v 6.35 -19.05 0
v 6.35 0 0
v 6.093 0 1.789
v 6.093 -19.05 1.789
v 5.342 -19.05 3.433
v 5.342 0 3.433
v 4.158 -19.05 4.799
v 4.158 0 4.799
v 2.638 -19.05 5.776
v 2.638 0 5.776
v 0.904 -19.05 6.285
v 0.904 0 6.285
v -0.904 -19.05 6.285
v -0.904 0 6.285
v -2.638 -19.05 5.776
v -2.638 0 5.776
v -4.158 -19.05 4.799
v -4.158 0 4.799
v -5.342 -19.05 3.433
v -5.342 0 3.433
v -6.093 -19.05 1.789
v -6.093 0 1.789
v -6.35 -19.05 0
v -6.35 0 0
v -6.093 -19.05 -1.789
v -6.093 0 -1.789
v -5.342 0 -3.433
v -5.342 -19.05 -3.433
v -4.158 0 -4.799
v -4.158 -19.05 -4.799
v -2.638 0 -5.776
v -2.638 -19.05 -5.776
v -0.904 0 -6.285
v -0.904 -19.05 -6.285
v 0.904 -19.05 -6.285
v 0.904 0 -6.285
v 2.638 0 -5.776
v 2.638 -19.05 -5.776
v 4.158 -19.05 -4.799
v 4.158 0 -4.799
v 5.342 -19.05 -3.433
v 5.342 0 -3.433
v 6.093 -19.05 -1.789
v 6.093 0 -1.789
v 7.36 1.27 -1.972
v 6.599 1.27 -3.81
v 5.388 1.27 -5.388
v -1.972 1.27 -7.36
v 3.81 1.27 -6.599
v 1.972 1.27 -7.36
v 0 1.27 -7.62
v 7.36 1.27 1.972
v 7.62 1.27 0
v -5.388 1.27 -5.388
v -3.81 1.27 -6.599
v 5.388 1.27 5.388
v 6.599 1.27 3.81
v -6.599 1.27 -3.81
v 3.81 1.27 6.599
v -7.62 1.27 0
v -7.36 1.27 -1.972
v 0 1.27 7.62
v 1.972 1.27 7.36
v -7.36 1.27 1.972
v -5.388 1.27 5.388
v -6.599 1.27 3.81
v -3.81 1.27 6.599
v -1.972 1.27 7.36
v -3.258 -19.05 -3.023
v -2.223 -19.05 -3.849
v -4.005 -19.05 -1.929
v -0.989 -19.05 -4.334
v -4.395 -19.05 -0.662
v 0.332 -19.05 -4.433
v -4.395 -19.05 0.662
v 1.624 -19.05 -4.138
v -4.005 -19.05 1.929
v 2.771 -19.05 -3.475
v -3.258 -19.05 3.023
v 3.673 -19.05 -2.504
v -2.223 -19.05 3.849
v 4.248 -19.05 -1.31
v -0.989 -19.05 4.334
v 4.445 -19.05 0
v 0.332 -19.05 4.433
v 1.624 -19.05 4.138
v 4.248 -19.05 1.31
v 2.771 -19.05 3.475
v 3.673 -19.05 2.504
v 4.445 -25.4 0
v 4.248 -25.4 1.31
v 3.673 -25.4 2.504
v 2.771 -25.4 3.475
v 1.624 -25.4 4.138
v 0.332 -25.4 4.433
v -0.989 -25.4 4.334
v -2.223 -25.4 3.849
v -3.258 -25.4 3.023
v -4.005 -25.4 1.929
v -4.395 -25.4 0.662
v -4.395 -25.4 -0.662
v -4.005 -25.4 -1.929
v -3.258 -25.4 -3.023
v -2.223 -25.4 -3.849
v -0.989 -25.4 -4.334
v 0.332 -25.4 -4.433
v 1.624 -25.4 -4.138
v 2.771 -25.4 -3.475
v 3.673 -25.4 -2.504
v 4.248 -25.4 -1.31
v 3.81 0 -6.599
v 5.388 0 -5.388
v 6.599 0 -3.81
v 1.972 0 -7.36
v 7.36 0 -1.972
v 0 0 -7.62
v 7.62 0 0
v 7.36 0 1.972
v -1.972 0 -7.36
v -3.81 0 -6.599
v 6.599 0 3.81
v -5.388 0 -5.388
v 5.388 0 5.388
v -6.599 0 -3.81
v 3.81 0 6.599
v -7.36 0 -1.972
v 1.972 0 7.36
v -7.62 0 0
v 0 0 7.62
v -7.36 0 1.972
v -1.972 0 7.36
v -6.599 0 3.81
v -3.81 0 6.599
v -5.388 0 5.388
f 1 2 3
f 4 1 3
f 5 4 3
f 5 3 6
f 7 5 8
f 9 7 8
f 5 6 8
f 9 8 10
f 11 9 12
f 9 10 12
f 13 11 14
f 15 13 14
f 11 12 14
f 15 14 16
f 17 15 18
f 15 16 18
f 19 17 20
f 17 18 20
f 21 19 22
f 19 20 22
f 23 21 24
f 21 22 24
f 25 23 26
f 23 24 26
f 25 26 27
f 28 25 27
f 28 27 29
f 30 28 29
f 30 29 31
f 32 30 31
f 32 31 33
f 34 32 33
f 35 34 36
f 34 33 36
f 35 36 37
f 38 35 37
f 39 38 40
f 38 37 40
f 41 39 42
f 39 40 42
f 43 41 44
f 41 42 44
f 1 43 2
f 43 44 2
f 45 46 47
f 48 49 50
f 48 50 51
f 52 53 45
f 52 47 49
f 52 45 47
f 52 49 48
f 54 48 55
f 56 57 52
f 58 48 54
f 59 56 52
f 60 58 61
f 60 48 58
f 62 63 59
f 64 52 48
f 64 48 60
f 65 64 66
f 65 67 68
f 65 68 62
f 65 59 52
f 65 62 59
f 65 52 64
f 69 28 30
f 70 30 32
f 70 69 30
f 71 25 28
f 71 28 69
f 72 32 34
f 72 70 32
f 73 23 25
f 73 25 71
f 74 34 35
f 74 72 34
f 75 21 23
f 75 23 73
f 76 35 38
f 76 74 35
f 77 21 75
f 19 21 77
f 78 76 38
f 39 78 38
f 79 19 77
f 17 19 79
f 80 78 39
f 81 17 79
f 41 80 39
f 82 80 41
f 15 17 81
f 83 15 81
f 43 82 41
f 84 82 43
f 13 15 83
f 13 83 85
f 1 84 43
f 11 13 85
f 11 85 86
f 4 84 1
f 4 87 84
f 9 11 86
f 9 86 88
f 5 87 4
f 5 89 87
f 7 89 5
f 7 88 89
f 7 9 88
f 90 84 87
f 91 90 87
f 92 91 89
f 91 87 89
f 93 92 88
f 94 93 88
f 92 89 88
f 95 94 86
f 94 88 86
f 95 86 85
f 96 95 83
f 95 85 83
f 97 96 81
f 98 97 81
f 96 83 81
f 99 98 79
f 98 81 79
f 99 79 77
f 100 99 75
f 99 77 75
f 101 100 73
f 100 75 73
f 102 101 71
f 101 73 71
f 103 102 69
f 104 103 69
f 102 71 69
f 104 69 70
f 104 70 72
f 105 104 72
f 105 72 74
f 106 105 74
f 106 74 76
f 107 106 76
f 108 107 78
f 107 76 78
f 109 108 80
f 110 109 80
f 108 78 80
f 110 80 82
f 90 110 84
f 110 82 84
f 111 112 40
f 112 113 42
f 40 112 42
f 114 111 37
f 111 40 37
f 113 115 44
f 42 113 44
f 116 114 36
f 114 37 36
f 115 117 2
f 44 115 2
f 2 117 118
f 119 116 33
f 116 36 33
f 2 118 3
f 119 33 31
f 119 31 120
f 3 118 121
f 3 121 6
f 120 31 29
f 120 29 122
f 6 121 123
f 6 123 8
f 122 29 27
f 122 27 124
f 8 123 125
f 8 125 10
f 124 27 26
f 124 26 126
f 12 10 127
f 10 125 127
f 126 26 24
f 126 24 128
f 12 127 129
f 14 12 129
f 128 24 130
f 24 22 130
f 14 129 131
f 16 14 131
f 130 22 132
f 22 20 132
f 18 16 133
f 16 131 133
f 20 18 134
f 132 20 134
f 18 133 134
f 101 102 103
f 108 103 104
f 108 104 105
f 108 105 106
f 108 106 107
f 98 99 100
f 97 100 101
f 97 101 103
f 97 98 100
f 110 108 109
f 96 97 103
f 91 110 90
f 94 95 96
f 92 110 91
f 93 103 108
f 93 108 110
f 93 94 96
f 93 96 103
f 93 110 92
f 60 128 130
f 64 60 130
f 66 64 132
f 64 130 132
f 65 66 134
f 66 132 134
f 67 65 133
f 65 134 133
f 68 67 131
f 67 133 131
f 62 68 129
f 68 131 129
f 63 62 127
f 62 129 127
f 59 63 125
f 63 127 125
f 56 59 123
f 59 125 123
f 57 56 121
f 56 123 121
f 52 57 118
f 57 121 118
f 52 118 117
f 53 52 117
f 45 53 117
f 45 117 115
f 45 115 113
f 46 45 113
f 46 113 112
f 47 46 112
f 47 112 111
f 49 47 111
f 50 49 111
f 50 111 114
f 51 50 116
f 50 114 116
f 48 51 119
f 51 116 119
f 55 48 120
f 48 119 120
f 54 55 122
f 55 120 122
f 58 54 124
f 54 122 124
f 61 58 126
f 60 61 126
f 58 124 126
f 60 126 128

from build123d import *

# Parameters (mm, degrees)
F0_R     = 6.35
F1_DEPTH = 19.05
F2_R     = 7.62
F3_DEPTH = 1.27
F4_R     = 4.445
F5_DEPTH = 6.35


with BuildPart() as f1:
    # F0 (on Front) → F1 (new body)
    with BuildSketch(Plane.XZ):
        Circle(F0_R)
    extrude(amount=F1_DEPTH)

    # F2 (on face) → F3 (join)
    with BuildSketch(Plane(origin=(0, 0, 0), x_dir=(-1, 0, 0), z_dir=(0, 1, 0))):
        Circle(F2_R)
    extrude(amount=F3_DEPTH)

    # F4 (on face) → F5 (join)
    with BuildSketch(Plane.XZ.offset(19.05)):
        Circle(F4_R)
    extrude(amount=F5_DEPTH)


solid = f1.part
